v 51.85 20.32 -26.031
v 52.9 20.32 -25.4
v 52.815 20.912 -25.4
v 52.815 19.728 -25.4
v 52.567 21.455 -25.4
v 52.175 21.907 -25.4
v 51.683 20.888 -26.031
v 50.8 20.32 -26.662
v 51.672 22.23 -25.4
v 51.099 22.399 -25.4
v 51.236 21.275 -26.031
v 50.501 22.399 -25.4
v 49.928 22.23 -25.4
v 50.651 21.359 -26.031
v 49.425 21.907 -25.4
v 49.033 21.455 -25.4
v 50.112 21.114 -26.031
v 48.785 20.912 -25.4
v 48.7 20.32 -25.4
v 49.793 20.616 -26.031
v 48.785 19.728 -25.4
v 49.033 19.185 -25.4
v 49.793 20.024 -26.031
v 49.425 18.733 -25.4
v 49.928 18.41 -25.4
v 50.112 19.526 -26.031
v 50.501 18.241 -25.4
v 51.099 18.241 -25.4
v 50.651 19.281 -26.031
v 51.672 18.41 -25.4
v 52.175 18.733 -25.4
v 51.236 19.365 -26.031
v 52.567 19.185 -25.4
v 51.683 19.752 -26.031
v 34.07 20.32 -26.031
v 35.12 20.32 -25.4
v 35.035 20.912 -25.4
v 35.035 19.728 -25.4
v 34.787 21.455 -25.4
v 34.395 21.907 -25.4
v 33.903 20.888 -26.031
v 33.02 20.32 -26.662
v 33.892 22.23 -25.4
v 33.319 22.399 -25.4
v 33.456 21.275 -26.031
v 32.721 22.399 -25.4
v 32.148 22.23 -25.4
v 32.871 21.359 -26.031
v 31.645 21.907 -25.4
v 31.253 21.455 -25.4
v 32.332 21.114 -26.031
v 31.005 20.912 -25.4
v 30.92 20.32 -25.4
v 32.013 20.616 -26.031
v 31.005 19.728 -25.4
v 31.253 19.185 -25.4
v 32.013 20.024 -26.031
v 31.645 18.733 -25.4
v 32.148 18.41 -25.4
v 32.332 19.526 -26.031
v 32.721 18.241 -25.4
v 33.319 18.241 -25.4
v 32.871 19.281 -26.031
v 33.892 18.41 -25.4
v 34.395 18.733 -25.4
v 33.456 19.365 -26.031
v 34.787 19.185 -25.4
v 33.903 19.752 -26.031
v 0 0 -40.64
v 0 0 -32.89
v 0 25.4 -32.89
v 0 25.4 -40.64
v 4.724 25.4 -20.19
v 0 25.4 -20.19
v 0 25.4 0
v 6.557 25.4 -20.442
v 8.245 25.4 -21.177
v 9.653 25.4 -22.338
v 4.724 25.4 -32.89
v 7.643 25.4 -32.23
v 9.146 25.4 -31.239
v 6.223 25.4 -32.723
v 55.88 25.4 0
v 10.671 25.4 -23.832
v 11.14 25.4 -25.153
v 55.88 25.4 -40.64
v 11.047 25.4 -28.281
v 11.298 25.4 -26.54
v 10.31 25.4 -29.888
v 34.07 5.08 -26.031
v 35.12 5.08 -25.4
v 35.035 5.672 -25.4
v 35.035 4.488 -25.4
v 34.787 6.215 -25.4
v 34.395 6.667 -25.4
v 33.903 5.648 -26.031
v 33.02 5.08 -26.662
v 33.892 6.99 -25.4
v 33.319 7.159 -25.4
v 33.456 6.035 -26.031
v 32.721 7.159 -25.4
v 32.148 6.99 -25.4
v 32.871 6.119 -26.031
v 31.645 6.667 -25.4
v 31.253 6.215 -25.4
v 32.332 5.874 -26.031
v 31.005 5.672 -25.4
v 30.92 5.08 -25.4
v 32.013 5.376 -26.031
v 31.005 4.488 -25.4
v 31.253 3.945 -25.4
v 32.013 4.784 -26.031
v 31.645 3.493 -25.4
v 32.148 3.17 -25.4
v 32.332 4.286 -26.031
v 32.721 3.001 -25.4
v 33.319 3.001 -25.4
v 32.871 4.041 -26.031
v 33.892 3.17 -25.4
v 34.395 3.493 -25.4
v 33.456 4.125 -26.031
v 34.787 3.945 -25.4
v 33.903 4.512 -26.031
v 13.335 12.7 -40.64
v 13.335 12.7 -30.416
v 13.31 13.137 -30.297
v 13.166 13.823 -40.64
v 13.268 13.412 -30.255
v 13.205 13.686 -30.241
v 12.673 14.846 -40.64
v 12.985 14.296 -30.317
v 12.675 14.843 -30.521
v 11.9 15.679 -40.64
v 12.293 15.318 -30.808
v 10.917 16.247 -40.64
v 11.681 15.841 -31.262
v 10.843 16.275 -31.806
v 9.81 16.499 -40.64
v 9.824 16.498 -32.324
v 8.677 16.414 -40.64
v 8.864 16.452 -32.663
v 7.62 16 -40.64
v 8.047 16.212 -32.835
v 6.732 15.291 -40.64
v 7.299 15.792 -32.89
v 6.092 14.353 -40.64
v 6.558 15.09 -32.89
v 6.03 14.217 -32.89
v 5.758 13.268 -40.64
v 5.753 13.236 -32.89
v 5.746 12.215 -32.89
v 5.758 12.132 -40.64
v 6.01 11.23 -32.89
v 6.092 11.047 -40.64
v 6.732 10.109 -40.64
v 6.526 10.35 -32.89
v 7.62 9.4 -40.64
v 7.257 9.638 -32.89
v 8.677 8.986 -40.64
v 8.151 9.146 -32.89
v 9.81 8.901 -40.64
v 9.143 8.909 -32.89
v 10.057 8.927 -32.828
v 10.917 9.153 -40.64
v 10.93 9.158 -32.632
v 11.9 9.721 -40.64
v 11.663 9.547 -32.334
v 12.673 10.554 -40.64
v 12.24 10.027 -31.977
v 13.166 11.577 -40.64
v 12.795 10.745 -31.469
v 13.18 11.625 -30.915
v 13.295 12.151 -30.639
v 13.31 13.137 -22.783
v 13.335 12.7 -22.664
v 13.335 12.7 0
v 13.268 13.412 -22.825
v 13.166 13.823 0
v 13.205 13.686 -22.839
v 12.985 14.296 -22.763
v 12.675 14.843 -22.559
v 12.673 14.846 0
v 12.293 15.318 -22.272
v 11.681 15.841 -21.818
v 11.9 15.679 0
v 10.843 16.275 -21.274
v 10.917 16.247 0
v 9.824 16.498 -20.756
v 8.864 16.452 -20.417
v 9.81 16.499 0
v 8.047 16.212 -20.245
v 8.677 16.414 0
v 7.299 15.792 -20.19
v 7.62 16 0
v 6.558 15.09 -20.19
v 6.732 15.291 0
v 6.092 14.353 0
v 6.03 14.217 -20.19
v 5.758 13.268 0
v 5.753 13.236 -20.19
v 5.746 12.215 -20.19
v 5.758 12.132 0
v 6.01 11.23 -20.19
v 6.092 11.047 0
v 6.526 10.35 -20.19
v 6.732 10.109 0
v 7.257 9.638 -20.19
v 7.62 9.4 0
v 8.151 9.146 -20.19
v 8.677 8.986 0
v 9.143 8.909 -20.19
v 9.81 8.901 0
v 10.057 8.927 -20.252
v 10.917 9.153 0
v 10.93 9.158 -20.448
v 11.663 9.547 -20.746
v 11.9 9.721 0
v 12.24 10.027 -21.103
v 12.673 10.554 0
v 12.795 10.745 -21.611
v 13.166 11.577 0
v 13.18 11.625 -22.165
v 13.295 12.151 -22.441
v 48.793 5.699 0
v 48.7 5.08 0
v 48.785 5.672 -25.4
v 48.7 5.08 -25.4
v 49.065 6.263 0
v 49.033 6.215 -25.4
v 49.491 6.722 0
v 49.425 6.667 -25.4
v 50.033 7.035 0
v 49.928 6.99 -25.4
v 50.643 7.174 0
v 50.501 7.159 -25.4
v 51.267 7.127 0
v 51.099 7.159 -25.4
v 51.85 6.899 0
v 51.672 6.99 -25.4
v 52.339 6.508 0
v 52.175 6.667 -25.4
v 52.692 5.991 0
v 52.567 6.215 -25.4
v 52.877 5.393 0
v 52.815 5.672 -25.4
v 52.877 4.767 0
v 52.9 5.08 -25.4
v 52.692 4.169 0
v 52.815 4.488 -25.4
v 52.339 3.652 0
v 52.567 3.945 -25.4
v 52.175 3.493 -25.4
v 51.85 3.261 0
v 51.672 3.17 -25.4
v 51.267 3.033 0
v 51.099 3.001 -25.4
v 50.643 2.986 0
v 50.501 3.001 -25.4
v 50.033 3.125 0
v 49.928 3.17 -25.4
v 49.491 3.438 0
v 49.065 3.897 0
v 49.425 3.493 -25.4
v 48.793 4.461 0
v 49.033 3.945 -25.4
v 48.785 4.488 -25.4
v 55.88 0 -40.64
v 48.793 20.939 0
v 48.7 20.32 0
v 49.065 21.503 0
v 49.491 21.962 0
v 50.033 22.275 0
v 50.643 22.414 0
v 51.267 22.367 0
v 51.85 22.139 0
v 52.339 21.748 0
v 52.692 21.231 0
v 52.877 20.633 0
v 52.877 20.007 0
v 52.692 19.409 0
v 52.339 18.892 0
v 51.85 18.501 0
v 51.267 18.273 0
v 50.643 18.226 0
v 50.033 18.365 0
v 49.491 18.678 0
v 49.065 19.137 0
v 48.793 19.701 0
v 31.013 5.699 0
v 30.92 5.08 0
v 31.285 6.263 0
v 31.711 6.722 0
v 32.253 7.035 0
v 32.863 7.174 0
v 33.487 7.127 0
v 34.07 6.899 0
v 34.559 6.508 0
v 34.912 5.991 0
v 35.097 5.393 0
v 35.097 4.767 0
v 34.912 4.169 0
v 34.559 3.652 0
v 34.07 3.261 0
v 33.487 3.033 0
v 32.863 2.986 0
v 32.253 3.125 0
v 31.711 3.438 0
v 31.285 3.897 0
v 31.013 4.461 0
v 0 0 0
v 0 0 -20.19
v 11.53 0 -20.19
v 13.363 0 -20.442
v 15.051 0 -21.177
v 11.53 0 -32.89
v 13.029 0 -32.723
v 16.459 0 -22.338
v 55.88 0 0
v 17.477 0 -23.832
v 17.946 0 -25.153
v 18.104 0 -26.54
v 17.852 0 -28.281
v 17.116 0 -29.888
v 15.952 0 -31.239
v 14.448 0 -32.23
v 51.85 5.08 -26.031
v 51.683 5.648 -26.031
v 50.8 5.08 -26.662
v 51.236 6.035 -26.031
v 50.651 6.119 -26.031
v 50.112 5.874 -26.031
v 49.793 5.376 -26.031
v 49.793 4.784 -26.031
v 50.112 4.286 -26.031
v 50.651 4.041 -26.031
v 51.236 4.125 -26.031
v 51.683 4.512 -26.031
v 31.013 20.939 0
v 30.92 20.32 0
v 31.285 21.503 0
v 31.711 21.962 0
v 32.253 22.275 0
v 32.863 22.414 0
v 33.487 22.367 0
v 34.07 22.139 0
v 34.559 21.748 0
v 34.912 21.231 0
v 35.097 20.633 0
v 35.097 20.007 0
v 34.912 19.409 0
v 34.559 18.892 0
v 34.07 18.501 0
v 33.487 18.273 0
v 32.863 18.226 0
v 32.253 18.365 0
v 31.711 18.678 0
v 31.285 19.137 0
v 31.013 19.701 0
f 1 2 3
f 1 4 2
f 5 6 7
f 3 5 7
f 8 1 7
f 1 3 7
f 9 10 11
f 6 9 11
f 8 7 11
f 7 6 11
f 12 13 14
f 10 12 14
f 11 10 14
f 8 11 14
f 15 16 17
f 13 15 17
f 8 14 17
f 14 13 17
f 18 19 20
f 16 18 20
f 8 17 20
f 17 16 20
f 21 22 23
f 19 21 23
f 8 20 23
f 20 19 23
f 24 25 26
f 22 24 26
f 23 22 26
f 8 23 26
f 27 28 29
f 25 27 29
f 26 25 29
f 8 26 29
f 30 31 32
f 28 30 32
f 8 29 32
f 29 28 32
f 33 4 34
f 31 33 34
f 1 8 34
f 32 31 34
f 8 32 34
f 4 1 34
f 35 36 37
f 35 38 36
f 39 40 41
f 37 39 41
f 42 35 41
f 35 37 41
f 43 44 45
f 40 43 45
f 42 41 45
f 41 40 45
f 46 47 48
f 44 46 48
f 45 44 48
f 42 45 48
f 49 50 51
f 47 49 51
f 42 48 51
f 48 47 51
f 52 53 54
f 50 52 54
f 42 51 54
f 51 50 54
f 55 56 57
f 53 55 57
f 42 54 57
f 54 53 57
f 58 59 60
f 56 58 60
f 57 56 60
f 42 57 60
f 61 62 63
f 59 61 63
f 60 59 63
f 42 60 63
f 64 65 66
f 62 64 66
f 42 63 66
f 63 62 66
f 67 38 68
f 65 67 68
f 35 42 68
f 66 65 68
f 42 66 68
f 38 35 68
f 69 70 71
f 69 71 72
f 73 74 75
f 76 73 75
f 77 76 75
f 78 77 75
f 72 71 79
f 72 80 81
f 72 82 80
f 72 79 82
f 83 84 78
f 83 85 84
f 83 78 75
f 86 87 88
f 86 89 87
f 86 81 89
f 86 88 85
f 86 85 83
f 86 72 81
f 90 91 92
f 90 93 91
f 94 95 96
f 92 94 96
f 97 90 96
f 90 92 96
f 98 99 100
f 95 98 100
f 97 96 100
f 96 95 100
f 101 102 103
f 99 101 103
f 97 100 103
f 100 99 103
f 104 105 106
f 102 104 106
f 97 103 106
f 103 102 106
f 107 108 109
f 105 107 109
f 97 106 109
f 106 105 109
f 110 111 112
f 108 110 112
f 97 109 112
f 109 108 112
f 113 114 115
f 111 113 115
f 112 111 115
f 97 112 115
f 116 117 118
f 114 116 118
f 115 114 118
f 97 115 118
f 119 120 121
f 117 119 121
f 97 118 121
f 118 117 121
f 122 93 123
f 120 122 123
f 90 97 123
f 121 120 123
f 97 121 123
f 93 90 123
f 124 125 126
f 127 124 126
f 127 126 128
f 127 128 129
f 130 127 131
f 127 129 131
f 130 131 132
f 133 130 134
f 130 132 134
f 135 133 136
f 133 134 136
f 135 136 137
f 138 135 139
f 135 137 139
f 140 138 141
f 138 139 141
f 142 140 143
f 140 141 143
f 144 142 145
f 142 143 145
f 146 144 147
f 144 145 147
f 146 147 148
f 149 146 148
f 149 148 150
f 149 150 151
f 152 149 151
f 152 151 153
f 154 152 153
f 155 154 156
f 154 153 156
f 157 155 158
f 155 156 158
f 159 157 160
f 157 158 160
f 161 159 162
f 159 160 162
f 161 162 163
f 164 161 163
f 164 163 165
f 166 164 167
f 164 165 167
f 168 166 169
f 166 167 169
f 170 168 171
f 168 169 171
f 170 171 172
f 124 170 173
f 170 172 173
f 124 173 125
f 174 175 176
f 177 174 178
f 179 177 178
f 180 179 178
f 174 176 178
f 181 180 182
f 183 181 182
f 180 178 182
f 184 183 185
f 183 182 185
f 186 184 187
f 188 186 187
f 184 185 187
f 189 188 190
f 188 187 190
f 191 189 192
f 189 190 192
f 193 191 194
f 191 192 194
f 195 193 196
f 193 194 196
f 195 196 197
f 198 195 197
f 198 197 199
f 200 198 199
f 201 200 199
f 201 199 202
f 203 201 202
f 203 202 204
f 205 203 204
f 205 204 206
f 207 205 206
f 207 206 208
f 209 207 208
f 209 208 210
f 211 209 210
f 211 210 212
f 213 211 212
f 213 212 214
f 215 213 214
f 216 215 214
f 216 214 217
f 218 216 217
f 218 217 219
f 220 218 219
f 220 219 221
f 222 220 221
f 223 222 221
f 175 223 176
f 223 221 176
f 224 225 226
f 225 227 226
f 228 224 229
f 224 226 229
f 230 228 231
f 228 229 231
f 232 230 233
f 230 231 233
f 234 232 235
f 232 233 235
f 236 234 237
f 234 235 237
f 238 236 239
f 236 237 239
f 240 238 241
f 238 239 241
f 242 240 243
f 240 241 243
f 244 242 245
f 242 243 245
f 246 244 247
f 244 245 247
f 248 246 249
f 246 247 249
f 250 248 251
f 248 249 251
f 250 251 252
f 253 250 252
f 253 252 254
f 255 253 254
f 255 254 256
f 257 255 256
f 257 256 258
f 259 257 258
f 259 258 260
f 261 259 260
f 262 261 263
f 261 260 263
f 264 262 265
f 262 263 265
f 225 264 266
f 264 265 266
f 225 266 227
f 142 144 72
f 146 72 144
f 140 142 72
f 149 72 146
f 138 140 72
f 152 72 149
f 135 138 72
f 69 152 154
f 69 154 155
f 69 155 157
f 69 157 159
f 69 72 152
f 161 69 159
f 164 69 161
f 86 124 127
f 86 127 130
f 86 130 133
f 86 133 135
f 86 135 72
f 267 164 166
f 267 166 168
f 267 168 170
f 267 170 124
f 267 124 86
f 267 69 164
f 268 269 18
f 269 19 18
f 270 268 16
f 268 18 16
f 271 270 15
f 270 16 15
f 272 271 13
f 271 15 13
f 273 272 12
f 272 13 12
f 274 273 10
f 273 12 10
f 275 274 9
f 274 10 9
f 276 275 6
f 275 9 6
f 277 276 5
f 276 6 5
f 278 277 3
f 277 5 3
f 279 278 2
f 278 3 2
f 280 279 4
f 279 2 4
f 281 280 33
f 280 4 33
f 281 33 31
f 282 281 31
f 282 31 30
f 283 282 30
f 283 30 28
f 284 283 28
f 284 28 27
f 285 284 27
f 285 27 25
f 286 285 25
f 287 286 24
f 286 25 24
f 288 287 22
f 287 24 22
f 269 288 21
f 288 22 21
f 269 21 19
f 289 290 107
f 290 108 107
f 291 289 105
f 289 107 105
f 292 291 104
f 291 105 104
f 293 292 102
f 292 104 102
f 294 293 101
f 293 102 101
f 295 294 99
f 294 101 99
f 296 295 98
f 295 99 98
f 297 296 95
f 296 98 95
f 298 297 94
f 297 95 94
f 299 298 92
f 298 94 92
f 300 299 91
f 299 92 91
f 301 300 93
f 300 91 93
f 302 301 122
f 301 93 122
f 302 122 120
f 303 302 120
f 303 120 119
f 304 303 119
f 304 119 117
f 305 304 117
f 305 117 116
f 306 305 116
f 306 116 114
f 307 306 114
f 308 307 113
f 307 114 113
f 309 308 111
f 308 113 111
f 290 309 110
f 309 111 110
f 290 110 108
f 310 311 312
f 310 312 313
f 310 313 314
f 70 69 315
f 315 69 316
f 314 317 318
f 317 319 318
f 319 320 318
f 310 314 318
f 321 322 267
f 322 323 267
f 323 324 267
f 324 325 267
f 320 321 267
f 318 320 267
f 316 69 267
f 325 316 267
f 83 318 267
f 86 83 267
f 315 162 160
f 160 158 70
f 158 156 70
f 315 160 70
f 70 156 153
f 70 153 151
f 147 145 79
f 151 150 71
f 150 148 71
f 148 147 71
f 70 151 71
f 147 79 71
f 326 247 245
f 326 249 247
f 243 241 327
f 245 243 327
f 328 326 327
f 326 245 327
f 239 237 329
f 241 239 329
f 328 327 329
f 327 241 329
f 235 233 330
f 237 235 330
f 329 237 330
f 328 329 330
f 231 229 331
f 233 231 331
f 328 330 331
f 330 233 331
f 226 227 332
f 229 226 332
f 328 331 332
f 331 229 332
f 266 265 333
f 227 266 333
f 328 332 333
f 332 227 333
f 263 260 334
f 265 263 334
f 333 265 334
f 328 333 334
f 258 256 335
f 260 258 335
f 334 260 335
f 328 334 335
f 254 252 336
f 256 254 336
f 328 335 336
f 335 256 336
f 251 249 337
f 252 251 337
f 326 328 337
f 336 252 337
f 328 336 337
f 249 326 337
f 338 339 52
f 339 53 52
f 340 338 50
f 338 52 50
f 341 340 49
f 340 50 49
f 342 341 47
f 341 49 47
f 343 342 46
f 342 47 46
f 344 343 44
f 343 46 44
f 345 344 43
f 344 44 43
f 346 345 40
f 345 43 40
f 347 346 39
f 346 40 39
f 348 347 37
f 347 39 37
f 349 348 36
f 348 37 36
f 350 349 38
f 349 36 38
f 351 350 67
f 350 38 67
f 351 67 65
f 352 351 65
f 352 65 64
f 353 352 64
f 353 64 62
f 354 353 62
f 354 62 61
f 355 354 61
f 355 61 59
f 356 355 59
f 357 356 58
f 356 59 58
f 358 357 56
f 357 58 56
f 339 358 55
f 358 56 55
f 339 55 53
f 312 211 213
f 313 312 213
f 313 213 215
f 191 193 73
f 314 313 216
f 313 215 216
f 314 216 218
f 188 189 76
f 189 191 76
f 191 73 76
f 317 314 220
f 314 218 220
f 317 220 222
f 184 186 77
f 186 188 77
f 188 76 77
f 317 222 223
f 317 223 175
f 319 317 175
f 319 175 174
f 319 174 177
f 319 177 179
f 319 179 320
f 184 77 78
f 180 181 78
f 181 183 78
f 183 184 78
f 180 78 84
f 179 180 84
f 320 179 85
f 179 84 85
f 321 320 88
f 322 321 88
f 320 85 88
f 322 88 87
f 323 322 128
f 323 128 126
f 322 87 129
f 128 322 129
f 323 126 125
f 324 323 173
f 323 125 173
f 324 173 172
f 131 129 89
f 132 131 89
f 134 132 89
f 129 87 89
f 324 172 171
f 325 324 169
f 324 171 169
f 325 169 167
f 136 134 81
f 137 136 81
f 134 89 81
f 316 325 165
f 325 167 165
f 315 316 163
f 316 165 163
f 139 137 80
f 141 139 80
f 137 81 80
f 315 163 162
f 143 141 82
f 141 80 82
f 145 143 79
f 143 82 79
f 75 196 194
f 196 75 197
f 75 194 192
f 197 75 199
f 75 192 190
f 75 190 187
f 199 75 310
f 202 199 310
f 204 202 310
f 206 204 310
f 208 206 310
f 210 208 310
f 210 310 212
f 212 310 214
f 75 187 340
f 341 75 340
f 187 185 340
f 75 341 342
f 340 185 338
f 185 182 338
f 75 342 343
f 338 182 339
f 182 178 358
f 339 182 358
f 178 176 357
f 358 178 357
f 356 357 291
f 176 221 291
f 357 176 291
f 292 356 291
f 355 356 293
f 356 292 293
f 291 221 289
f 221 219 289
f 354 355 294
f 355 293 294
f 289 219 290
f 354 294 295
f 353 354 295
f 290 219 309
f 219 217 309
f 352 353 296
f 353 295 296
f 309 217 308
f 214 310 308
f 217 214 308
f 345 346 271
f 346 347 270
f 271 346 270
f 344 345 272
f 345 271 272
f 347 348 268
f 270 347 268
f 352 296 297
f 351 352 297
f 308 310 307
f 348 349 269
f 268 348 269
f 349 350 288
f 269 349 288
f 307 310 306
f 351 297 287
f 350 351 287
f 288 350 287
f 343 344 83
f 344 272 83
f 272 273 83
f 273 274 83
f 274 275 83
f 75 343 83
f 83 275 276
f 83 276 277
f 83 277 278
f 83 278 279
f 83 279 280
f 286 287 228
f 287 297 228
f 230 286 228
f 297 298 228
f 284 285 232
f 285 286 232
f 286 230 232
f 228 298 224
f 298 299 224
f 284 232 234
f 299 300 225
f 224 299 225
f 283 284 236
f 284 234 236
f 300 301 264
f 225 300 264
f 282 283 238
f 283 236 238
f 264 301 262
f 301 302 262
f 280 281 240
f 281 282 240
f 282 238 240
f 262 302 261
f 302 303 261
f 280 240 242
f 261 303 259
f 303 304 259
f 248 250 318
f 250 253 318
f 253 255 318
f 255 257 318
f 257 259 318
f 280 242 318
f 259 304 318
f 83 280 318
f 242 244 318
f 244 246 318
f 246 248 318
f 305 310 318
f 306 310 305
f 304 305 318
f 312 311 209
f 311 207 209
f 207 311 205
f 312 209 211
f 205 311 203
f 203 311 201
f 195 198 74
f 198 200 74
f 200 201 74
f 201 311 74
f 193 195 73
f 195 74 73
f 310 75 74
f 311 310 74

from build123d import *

# Parameters (mm, degrees)
SKETCH1_W                 = 55.88
SKETCH1_H                 = 40.64
BOSS_EXTRUDE1_DEPTH       = 25.4
SKETCH3_R                 = 3.81
CUT_EXTRUDE1_DEPTH        = 74.616193871
M5X0_8_TAPPED_HOLE1_D     = 4.2
M5X0_8_TAPPED_HOLE1_DEPTH = 25.4
M5X0_8_TAPPED_HOLE1_TIP   = 1.2618073
CUT_EXTRUDE3_DEPTH        = 73.924463946
CUT_EXTRUDE3_DEPTH_BACK   = 73.924463946


with BuildPart() as part:
    # Sketch1 → Boss-Extrude1 (new body)
    with BuildSketch(Plane(origin=(0, 0, 0), x_dir=(1, 0, 0), z_dir=(0, 1, 0))):
        with Locations((27.94, 20.32)):
            Rectangle(SKETCH1_W, SKETCH1_H)
    extrude(amount=BOSS_EXTRUDE1_DEPTH)

    # Sketch3 → Cut-Extrude1 (cut, through all)
    with BuildSketch(Plane.XY):
        with Locations((9.525, 12.7)):
            Circle(SKETCH3_R)
    extrude(amount=-CUT_EXTRUDE1_DEPTH, mode=Mode.SUBTRACT)

    # M5x0.8 Tapped Hole1
    with Locations(Plane.XY):
        with Locations((50.8, 5.08), (33.02, 5.08), (33.02, 20.32), (50.8, 20.32)):
            Hole(M5X0_8_TAPPED_HOLE1_D / 2, depth=M5X0_8_TAPPED_HOLE1_DEPTH)
            with Locations((0, 0, -(M5X0_8_TAPPED_HOLE1_DEPTH + M5X0_8_TAPPED_HOLE1_TIP / 2))):  # 118° drill point
                Cone(0, M5X0_8_TAPPED_HOLE1_D / 2, M5X0_8_TAPPED_HOLE1_TIP, mode=Mode.SUBTRACT)

    # Sketch8 → Cut-Extrude3 (cut, two sides: drawn at the far end of the back side and taken through both)
    with BuildSketch(Plane(origin=(-2.536945986, 9.468011314, 0), x_dir=(0.9659258262890681, 0.25881904510252135, 0), z_dir=(-0.25881904510252135, 0.9659258262890681, 0)).offset(-CUT_EXTRUDE3_DEPTH_BACK)):
        with BuildLine():
            Line((0, 20.19), (11.137445368, 20.19))
            ThreePointArc((11.137445368, 20.19), (17.487445368, 26.54), (11.137445368, 32.89))
            Line((11.137445368, 32.89), (0, 32.89))
            Line((0, 32.89), (0, 20.19))
        make_face()
    extrude(amount=CUT_EXTRUDE3_DEPTH + CUT_EXTRUDE3_DEPTH_BACK, mode=Mode.SUBTRACT)


solid = part.part
